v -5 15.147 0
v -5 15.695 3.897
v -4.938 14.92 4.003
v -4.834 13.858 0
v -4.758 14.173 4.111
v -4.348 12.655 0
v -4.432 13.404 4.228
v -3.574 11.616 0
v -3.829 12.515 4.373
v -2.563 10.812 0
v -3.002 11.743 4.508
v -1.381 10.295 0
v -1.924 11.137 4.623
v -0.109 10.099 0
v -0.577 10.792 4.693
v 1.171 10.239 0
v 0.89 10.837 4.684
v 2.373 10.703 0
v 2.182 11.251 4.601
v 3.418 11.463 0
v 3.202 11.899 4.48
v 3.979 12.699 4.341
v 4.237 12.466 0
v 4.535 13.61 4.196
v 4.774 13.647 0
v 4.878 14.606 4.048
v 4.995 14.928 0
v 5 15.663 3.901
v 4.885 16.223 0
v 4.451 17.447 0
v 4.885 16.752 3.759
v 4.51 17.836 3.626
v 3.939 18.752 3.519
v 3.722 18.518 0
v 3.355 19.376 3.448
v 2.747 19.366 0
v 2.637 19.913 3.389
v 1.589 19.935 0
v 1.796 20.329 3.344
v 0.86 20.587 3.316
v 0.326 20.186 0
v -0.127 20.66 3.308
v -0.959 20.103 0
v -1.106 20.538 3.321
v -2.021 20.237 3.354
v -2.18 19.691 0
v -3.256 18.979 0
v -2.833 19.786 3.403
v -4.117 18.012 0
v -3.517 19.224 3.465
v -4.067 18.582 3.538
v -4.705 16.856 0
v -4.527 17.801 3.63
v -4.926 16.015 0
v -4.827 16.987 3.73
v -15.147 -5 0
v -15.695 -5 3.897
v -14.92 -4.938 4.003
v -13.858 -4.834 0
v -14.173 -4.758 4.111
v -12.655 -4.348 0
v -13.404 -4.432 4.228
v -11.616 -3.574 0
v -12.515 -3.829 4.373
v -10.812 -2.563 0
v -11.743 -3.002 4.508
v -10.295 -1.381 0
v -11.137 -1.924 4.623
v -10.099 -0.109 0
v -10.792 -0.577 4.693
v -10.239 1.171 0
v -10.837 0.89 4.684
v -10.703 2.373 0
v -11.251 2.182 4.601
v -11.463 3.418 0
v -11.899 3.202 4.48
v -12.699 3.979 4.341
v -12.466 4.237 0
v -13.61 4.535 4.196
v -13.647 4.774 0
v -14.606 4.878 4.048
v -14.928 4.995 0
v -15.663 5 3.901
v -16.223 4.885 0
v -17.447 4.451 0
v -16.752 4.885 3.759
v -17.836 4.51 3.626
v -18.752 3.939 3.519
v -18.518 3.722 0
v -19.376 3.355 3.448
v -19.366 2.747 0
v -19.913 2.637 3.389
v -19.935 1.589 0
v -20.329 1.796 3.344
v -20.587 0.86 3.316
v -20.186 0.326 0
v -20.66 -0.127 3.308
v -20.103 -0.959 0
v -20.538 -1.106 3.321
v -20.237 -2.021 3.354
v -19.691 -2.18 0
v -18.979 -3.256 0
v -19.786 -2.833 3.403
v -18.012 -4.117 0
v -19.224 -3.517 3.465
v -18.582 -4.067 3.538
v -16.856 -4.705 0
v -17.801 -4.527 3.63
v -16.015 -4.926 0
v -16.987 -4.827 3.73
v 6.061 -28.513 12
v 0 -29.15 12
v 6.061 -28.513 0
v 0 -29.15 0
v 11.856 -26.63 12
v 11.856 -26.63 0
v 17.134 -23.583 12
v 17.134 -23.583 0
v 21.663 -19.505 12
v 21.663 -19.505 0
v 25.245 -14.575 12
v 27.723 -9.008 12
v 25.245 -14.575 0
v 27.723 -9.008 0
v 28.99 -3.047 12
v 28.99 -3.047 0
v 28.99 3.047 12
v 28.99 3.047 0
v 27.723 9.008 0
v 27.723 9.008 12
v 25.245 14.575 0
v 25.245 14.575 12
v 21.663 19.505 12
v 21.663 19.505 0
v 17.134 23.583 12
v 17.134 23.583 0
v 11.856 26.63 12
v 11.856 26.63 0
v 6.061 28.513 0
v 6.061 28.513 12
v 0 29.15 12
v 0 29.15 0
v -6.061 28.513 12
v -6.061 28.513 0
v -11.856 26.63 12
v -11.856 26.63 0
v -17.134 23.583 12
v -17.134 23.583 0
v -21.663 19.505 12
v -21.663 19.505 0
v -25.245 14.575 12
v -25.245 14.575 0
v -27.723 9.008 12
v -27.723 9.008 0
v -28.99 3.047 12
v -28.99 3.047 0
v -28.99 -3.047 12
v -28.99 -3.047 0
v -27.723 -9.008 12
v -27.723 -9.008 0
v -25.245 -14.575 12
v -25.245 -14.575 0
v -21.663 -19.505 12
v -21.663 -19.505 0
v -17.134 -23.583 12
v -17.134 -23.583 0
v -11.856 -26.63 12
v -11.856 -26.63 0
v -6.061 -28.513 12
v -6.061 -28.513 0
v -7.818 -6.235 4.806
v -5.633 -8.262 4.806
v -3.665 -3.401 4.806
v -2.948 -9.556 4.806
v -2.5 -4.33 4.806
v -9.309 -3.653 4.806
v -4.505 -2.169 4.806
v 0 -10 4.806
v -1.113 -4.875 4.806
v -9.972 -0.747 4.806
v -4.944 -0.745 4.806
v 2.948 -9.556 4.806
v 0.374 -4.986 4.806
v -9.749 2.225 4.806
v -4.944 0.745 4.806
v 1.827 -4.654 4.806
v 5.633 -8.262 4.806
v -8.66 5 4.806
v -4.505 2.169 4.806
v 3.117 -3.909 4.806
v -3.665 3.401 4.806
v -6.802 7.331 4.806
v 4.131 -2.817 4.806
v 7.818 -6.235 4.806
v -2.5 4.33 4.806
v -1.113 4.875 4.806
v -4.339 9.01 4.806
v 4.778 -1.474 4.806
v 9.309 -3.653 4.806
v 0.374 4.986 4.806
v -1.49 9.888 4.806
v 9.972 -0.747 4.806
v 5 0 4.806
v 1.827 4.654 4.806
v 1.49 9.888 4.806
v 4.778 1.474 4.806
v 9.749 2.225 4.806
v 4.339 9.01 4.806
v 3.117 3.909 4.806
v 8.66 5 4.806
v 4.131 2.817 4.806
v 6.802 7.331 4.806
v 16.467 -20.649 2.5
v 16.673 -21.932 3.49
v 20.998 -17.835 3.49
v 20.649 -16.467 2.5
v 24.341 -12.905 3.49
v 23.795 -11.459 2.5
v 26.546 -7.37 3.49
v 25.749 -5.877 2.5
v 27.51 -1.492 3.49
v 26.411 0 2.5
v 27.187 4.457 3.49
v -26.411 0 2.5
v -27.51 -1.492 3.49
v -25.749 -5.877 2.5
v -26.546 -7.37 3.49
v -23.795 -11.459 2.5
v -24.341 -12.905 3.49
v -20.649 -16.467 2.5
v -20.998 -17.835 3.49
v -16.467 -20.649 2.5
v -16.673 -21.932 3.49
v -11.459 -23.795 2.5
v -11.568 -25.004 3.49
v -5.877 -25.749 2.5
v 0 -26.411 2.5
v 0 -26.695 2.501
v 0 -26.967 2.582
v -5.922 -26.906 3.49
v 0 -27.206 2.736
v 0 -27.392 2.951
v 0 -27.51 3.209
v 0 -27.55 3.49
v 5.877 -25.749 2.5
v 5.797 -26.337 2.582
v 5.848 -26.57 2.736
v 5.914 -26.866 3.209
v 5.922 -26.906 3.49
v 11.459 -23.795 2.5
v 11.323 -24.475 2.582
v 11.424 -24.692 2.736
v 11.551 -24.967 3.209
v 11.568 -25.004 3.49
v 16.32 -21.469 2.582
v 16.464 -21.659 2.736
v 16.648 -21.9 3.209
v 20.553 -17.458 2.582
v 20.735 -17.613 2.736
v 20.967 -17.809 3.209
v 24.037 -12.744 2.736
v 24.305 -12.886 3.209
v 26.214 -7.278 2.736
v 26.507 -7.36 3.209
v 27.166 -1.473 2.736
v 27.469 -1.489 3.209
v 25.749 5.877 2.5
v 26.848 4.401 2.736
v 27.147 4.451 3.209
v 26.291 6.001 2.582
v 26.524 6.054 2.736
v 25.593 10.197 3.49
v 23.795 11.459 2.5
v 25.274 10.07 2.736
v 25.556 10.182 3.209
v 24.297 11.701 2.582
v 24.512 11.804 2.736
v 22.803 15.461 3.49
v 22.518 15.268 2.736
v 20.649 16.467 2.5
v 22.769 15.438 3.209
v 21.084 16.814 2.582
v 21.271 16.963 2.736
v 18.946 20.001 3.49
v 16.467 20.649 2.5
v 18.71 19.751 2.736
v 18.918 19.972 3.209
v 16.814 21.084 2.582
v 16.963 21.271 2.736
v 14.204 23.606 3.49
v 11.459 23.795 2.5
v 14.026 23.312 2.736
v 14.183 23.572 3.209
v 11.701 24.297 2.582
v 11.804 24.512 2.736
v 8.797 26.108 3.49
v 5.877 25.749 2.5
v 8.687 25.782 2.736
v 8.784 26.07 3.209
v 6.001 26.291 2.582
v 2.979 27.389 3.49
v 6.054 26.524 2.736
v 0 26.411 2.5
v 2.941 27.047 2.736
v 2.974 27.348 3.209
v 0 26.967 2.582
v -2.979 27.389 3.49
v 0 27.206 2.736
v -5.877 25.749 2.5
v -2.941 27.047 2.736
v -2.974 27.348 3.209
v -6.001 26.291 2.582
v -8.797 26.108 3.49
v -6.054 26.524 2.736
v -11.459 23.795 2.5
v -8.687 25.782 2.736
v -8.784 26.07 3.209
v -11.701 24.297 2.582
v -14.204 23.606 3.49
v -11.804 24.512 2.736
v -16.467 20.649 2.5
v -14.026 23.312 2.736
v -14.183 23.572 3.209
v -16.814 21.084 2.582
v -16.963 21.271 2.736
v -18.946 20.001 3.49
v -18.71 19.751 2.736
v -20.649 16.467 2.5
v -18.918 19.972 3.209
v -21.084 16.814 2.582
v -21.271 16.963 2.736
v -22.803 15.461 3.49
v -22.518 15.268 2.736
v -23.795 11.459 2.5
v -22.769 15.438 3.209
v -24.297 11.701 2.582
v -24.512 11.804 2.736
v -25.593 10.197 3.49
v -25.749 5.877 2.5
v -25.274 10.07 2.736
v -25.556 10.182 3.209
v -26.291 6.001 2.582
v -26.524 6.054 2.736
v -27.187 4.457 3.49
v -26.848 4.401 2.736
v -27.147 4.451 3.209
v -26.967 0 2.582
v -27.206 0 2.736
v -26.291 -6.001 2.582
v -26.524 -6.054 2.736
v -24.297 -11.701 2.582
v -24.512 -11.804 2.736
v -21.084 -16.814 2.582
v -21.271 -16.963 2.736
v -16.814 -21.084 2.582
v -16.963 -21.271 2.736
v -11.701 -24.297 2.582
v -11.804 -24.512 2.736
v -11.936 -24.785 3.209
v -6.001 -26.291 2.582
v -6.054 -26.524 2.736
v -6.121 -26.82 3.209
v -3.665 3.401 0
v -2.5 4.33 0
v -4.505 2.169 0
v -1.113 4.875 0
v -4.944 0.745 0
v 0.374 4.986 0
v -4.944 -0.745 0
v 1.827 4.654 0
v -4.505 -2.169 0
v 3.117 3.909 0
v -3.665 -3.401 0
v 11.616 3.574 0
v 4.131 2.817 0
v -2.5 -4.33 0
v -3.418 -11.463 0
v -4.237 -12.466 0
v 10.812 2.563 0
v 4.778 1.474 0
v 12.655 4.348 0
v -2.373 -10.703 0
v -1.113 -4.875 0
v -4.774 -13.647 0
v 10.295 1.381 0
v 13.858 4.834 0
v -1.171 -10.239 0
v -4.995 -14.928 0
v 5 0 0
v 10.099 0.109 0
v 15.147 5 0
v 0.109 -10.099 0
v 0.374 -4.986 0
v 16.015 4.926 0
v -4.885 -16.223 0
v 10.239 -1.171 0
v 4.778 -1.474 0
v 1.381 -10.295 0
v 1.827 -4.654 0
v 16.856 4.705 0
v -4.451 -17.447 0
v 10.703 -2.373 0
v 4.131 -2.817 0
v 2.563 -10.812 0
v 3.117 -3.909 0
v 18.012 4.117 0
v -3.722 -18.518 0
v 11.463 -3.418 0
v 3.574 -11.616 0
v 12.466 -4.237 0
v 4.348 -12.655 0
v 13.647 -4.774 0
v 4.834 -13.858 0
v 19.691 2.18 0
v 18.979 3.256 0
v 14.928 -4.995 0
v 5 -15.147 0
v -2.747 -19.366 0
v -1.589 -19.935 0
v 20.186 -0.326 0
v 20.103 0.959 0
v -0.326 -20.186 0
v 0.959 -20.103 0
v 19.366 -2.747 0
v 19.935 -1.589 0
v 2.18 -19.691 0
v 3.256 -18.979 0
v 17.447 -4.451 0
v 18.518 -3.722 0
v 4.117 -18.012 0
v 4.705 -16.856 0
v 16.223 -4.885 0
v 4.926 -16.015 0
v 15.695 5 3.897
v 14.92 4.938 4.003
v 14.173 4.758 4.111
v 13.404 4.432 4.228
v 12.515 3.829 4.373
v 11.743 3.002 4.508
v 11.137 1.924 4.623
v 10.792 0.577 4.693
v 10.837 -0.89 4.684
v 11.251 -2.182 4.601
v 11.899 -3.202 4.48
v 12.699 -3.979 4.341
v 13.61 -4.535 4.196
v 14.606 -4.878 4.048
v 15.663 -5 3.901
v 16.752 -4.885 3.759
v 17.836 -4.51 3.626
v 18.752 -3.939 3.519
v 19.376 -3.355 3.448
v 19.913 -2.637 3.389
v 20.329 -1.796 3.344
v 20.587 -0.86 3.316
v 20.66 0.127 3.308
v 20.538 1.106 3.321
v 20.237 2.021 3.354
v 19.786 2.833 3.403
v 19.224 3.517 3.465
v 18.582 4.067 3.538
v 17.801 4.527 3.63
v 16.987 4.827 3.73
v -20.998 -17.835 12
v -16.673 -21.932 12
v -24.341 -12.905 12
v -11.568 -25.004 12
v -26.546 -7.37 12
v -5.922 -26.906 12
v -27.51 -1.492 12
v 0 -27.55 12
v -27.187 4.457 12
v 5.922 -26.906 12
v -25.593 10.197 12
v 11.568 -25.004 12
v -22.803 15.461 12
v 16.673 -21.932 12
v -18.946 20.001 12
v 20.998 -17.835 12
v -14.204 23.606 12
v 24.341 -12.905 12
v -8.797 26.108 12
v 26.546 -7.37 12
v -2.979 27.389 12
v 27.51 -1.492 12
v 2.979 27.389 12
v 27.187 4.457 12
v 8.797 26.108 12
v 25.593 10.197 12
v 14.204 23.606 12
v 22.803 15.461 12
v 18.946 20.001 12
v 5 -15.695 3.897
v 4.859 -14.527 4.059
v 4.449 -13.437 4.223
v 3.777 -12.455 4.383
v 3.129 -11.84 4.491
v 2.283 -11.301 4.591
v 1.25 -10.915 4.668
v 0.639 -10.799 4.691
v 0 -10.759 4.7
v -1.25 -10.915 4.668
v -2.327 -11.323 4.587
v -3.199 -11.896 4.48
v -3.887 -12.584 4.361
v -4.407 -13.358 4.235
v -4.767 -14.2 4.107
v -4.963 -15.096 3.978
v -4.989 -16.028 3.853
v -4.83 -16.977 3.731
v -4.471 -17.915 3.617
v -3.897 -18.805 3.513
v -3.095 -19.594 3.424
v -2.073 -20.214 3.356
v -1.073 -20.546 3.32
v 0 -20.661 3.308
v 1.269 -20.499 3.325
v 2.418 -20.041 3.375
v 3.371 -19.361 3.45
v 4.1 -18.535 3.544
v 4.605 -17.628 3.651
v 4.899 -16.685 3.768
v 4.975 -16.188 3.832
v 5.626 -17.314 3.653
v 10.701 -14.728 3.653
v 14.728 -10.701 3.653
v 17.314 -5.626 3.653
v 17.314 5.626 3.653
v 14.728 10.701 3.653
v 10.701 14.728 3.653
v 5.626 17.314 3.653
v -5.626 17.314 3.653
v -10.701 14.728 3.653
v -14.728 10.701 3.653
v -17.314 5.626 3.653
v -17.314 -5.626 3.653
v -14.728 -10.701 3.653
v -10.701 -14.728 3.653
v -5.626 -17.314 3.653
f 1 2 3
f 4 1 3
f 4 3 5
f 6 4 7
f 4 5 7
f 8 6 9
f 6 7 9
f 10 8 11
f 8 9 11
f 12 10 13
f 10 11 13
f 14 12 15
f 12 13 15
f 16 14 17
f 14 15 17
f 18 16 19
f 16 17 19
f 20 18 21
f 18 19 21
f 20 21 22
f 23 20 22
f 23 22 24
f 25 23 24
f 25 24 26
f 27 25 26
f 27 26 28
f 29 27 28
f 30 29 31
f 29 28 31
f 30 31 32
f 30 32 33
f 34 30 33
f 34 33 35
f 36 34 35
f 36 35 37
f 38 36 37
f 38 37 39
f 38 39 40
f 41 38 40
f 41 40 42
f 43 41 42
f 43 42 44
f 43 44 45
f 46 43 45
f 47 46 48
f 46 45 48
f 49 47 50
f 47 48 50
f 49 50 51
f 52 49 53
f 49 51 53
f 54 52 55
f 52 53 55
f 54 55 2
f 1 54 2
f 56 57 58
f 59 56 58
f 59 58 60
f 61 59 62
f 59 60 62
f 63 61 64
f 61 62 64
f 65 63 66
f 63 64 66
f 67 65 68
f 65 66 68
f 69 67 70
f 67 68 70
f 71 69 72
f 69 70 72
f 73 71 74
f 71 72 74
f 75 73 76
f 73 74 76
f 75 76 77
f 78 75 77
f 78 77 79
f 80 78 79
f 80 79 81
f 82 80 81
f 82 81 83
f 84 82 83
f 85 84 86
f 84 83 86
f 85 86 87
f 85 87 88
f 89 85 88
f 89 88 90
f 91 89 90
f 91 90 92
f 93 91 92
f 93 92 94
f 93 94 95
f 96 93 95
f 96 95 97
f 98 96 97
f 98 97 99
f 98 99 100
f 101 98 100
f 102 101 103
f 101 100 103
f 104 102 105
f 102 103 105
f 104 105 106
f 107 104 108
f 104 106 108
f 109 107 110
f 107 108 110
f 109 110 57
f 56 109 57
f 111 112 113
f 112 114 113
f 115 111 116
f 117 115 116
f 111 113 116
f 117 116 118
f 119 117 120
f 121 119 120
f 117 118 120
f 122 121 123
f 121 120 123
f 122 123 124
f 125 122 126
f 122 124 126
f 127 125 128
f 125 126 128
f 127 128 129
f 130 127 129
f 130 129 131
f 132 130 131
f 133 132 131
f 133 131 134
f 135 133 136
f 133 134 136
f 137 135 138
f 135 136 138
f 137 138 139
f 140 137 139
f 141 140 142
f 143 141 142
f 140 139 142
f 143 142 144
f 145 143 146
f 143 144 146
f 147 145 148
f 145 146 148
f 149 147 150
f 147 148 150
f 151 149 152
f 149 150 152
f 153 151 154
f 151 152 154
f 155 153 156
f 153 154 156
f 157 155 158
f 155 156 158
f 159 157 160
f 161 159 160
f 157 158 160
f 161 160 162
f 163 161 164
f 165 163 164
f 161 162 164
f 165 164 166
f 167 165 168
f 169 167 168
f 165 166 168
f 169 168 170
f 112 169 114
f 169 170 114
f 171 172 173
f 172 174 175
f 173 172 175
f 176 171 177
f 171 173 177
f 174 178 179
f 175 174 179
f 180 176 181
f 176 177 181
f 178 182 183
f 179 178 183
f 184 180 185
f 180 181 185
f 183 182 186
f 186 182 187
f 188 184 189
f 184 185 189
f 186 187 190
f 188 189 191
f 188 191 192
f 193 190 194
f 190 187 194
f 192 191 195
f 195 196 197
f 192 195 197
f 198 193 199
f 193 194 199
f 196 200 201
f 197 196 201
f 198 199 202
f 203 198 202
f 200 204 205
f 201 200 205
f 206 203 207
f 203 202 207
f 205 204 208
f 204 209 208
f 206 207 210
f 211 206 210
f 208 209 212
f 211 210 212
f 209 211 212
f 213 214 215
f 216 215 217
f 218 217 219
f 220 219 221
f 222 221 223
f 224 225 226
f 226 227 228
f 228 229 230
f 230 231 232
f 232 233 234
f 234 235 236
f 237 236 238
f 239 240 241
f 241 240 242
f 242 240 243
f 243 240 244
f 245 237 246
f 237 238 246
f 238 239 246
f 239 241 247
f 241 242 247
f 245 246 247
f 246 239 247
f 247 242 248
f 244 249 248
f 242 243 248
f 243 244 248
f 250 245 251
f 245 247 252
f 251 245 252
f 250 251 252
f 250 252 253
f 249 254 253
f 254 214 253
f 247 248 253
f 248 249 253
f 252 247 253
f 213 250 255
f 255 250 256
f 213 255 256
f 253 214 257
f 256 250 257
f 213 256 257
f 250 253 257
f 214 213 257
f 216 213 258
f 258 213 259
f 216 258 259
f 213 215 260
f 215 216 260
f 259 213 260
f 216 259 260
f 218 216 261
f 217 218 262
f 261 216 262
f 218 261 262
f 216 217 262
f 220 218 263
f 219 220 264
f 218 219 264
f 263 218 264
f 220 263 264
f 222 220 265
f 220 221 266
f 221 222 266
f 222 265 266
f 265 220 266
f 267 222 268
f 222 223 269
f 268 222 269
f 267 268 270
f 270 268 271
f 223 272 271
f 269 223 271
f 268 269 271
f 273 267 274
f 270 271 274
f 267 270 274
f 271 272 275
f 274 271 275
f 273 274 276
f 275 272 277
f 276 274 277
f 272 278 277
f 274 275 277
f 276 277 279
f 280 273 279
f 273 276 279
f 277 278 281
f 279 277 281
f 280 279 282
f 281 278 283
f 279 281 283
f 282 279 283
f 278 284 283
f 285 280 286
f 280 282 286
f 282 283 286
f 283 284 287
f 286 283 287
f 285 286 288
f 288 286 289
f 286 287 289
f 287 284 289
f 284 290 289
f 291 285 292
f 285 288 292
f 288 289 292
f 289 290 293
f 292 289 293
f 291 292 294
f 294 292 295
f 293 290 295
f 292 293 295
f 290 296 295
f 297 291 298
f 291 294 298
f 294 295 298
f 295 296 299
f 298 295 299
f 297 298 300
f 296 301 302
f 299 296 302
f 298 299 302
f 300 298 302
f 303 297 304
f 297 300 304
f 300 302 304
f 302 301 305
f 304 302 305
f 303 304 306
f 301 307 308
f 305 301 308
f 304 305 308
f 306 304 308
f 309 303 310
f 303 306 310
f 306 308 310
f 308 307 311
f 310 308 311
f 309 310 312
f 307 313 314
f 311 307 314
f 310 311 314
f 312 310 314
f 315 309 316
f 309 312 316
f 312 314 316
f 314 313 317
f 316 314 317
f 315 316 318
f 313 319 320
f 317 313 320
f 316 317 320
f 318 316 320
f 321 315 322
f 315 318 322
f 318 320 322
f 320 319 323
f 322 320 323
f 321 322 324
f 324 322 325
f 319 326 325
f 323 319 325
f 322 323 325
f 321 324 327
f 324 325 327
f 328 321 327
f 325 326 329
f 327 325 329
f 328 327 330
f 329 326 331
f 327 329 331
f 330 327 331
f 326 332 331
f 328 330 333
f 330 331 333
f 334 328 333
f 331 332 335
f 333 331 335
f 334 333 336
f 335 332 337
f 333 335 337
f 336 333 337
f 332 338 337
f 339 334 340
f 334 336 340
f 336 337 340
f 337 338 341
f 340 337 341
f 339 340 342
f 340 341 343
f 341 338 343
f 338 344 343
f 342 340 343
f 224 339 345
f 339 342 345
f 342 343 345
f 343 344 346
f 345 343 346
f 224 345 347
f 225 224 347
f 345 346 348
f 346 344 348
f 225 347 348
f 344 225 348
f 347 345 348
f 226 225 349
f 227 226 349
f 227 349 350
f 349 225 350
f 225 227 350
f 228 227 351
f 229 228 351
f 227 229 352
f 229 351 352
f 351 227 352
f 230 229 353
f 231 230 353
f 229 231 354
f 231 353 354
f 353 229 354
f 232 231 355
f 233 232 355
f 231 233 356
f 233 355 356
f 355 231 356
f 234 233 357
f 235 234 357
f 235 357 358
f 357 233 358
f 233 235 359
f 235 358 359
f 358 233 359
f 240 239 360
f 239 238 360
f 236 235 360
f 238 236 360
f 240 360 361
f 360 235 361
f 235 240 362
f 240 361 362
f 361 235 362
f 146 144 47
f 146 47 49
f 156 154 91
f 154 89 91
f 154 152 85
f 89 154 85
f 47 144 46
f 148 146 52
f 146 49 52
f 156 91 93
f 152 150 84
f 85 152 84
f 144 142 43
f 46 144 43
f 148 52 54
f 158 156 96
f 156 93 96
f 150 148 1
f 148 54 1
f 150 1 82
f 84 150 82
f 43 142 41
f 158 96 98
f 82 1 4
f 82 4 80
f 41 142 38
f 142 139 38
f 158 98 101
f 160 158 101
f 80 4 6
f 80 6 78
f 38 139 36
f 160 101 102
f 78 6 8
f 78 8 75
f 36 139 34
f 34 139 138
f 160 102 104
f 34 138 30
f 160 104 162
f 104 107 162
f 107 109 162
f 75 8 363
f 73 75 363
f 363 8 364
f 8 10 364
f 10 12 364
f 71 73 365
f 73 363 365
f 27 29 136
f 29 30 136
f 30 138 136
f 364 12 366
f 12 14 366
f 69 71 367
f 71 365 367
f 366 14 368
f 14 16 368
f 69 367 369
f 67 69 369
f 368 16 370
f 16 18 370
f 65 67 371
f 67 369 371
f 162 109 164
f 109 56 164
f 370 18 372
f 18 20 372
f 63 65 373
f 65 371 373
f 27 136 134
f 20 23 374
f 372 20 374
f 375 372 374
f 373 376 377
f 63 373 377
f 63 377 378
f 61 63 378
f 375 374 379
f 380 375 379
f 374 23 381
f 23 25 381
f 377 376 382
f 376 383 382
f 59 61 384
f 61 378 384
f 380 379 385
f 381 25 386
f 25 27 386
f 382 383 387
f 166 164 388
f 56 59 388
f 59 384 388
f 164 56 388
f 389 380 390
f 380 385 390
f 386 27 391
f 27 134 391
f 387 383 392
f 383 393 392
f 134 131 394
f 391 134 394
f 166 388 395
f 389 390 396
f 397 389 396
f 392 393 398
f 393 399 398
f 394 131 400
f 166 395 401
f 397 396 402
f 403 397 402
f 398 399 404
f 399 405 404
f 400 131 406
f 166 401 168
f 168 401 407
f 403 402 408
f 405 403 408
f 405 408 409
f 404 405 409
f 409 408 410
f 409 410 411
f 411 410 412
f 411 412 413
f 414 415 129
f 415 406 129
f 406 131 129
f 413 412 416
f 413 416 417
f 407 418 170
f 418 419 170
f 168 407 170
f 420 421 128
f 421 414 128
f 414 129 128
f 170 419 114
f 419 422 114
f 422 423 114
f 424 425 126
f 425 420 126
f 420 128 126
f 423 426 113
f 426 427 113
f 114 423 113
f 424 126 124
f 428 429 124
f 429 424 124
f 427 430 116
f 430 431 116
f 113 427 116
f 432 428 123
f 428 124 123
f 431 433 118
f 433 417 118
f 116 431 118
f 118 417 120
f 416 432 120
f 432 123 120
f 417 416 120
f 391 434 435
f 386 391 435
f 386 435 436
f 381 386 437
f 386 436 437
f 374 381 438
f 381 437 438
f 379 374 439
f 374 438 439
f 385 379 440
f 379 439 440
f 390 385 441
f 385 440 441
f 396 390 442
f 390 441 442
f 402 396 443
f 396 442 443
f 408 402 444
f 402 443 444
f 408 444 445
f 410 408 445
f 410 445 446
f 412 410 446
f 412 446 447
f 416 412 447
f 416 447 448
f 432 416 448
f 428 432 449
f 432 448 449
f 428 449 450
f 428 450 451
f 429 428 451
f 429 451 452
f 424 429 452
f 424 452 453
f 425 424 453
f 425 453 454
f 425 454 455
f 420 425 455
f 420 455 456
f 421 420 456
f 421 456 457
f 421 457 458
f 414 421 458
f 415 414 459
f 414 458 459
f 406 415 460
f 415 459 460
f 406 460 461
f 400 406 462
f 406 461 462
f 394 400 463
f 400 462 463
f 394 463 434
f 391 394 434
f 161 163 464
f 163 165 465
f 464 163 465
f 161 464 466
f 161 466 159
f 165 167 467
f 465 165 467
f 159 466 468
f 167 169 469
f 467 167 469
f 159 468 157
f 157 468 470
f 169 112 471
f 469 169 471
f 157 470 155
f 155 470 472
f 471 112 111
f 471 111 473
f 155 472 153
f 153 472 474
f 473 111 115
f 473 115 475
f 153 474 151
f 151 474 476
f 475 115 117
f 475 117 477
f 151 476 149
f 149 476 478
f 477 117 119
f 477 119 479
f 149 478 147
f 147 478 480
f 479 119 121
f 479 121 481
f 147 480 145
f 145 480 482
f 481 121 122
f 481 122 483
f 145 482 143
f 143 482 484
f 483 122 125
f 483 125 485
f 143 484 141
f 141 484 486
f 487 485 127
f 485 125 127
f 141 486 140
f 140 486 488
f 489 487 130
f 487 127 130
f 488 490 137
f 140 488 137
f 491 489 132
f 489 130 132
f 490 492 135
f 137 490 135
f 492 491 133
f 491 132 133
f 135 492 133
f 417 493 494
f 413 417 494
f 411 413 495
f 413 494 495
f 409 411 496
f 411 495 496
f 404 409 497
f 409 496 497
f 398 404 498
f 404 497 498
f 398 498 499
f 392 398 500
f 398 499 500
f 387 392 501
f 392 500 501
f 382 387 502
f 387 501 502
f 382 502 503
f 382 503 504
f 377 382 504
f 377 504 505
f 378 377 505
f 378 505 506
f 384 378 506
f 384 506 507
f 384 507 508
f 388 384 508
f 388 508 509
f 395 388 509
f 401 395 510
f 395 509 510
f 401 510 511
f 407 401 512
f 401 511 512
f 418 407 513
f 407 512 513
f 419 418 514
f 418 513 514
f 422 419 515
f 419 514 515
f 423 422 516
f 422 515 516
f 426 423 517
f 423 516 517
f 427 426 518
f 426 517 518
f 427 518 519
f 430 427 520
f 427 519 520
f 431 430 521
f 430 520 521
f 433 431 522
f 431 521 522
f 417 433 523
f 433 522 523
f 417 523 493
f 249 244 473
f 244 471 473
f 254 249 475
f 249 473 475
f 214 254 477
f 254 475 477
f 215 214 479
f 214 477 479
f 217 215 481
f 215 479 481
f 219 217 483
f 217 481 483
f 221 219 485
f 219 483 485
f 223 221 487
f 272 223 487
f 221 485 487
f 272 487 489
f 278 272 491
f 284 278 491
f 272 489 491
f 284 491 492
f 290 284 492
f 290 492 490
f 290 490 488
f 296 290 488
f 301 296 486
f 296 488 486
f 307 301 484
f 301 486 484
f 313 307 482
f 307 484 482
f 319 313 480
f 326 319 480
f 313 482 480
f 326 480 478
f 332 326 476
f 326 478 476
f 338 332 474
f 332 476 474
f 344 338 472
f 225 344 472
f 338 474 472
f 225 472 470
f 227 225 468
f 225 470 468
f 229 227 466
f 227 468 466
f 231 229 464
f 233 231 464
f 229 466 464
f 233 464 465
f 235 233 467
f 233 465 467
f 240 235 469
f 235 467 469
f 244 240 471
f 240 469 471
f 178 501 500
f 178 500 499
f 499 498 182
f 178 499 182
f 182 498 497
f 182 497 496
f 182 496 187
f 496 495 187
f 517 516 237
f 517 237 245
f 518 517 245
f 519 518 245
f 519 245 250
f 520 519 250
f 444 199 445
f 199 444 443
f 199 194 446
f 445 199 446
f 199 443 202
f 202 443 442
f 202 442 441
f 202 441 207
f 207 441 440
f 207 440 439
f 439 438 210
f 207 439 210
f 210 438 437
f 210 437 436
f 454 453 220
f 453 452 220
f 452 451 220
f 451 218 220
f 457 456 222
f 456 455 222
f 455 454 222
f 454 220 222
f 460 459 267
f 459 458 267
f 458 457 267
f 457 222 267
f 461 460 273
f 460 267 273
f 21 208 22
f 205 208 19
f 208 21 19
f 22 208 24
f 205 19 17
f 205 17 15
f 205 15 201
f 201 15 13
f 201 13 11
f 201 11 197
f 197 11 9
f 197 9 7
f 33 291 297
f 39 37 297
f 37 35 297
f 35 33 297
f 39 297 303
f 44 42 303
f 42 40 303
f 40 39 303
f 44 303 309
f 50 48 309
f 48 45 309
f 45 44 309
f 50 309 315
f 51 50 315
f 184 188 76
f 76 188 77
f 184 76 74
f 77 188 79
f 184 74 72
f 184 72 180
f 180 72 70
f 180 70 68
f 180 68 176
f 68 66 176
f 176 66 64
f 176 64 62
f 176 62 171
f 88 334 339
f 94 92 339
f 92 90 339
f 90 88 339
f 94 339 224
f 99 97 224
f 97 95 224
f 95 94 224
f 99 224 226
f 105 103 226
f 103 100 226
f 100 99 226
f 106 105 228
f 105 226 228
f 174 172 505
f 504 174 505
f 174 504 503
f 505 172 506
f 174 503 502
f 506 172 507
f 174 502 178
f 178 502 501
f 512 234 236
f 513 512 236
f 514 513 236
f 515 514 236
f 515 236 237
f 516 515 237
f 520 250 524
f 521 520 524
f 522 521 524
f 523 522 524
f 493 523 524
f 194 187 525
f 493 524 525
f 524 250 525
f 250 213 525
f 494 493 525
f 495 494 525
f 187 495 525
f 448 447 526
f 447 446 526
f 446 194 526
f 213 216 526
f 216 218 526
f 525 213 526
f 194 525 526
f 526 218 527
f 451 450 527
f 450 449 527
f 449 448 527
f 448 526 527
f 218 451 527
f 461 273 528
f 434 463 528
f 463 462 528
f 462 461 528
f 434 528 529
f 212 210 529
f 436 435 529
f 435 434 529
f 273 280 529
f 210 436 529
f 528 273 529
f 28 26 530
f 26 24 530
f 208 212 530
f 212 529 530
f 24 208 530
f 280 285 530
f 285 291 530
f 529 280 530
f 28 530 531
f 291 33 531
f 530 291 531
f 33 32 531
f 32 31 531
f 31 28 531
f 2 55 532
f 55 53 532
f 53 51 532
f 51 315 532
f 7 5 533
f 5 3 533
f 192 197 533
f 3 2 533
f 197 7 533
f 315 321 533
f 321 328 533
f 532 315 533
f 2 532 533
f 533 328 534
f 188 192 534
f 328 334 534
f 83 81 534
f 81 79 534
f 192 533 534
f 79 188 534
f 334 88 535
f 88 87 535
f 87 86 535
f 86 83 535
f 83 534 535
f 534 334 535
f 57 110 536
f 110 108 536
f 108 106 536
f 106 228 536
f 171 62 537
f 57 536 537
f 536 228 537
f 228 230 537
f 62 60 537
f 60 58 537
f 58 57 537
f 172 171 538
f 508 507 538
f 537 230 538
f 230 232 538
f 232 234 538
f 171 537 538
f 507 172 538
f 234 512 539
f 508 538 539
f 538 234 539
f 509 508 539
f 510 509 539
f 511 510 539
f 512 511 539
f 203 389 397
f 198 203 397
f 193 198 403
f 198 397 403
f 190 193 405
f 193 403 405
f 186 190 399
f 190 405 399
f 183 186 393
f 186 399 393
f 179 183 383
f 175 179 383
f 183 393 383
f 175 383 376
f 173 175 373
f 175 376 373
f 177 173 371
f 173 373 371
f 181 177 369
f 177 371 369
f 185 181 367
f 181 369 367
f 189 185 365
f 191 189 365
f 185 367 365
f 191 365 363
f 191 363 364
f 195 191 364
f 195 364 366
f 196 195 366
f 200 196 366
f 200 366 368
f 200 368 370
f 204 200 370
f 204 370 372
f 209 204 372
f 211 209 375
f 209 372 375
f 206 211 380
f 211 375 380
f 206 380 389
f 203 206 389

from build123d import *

# Parameters (mm, degrees)
F2_R            = 5
F3_DEPTH        = 4.8063913105
F5_R            = 5
F6_DEPTH        = 4.7469386033
F6_COPIES_COUNT = 4


# Not quite as in the source:
# - a pattern or mirror of a feature is missing from the dataset's text; its kind, count and spacing are read off the source's solid


with BuildPart() as f1:
    # F0 (on Right) → F1 (revolve)
    with BuildSketch(Plane.YZ):
        with BuildLine():
            Line((0, 0), (0, 4.8063913105))
            Line((0, 4.8063913105), (-10, 4.8063913105))
            Line((-10, 4.8063913105), (-26.410826899, 2.5))
            ThreePointArc((-26.410826899, 2.5), (-27.206059029, 2.7355584885), (-27.55, 3.4902680687))
            Line((-27.55, 3.4902680687), (-27.55, 12))
            Line((-27.55, 12), (-29.15, 12))
            Line((-29.15, 12), (-29.15, 0))
            Line((-29.15, 0), (0, 0))
        make_face()
    revolve(axis=Axis((0, 0, 11.0792994889), (0, 0, 1)))

    # F2 (on face) → F3 (cut, through all)
    with BuildSketch(Plane(origin=(0, 0, 0), x_dir=(1, 0, 0), z_dir=(0, 0, -1))):
        Circle(F2_R)
    extrude(amount=-F3_DEPTH, mode=Mode.SUBTRACT)

    # F5 (on line) → F6 (cut, through all)
    with BuildSketch(Plane(origin=(0, -0.8561020162, 6.0914823656), x_dir=(1, 0, 0), z_dir=(0, -0.139173101, 0.9902680687))):
        with Locations((0, -15)):
            Circle(F5_R)
    f6 = extrude(amount=-F6_DEPTH, mode=Mode.SUBTRACT)

    # F6_copies: F6 ×4 about axis
    f6_copies_axis = Axis((0, 0, 0), (0, 0, 1))
    for i in range(1, F6_COPIES_COUNT):
        add(f6.rotate(f6_copies_axis, i * 360 / F6_COPIES_COUNT), mode=Mode.SUBTRACT)


solid = f1.part
